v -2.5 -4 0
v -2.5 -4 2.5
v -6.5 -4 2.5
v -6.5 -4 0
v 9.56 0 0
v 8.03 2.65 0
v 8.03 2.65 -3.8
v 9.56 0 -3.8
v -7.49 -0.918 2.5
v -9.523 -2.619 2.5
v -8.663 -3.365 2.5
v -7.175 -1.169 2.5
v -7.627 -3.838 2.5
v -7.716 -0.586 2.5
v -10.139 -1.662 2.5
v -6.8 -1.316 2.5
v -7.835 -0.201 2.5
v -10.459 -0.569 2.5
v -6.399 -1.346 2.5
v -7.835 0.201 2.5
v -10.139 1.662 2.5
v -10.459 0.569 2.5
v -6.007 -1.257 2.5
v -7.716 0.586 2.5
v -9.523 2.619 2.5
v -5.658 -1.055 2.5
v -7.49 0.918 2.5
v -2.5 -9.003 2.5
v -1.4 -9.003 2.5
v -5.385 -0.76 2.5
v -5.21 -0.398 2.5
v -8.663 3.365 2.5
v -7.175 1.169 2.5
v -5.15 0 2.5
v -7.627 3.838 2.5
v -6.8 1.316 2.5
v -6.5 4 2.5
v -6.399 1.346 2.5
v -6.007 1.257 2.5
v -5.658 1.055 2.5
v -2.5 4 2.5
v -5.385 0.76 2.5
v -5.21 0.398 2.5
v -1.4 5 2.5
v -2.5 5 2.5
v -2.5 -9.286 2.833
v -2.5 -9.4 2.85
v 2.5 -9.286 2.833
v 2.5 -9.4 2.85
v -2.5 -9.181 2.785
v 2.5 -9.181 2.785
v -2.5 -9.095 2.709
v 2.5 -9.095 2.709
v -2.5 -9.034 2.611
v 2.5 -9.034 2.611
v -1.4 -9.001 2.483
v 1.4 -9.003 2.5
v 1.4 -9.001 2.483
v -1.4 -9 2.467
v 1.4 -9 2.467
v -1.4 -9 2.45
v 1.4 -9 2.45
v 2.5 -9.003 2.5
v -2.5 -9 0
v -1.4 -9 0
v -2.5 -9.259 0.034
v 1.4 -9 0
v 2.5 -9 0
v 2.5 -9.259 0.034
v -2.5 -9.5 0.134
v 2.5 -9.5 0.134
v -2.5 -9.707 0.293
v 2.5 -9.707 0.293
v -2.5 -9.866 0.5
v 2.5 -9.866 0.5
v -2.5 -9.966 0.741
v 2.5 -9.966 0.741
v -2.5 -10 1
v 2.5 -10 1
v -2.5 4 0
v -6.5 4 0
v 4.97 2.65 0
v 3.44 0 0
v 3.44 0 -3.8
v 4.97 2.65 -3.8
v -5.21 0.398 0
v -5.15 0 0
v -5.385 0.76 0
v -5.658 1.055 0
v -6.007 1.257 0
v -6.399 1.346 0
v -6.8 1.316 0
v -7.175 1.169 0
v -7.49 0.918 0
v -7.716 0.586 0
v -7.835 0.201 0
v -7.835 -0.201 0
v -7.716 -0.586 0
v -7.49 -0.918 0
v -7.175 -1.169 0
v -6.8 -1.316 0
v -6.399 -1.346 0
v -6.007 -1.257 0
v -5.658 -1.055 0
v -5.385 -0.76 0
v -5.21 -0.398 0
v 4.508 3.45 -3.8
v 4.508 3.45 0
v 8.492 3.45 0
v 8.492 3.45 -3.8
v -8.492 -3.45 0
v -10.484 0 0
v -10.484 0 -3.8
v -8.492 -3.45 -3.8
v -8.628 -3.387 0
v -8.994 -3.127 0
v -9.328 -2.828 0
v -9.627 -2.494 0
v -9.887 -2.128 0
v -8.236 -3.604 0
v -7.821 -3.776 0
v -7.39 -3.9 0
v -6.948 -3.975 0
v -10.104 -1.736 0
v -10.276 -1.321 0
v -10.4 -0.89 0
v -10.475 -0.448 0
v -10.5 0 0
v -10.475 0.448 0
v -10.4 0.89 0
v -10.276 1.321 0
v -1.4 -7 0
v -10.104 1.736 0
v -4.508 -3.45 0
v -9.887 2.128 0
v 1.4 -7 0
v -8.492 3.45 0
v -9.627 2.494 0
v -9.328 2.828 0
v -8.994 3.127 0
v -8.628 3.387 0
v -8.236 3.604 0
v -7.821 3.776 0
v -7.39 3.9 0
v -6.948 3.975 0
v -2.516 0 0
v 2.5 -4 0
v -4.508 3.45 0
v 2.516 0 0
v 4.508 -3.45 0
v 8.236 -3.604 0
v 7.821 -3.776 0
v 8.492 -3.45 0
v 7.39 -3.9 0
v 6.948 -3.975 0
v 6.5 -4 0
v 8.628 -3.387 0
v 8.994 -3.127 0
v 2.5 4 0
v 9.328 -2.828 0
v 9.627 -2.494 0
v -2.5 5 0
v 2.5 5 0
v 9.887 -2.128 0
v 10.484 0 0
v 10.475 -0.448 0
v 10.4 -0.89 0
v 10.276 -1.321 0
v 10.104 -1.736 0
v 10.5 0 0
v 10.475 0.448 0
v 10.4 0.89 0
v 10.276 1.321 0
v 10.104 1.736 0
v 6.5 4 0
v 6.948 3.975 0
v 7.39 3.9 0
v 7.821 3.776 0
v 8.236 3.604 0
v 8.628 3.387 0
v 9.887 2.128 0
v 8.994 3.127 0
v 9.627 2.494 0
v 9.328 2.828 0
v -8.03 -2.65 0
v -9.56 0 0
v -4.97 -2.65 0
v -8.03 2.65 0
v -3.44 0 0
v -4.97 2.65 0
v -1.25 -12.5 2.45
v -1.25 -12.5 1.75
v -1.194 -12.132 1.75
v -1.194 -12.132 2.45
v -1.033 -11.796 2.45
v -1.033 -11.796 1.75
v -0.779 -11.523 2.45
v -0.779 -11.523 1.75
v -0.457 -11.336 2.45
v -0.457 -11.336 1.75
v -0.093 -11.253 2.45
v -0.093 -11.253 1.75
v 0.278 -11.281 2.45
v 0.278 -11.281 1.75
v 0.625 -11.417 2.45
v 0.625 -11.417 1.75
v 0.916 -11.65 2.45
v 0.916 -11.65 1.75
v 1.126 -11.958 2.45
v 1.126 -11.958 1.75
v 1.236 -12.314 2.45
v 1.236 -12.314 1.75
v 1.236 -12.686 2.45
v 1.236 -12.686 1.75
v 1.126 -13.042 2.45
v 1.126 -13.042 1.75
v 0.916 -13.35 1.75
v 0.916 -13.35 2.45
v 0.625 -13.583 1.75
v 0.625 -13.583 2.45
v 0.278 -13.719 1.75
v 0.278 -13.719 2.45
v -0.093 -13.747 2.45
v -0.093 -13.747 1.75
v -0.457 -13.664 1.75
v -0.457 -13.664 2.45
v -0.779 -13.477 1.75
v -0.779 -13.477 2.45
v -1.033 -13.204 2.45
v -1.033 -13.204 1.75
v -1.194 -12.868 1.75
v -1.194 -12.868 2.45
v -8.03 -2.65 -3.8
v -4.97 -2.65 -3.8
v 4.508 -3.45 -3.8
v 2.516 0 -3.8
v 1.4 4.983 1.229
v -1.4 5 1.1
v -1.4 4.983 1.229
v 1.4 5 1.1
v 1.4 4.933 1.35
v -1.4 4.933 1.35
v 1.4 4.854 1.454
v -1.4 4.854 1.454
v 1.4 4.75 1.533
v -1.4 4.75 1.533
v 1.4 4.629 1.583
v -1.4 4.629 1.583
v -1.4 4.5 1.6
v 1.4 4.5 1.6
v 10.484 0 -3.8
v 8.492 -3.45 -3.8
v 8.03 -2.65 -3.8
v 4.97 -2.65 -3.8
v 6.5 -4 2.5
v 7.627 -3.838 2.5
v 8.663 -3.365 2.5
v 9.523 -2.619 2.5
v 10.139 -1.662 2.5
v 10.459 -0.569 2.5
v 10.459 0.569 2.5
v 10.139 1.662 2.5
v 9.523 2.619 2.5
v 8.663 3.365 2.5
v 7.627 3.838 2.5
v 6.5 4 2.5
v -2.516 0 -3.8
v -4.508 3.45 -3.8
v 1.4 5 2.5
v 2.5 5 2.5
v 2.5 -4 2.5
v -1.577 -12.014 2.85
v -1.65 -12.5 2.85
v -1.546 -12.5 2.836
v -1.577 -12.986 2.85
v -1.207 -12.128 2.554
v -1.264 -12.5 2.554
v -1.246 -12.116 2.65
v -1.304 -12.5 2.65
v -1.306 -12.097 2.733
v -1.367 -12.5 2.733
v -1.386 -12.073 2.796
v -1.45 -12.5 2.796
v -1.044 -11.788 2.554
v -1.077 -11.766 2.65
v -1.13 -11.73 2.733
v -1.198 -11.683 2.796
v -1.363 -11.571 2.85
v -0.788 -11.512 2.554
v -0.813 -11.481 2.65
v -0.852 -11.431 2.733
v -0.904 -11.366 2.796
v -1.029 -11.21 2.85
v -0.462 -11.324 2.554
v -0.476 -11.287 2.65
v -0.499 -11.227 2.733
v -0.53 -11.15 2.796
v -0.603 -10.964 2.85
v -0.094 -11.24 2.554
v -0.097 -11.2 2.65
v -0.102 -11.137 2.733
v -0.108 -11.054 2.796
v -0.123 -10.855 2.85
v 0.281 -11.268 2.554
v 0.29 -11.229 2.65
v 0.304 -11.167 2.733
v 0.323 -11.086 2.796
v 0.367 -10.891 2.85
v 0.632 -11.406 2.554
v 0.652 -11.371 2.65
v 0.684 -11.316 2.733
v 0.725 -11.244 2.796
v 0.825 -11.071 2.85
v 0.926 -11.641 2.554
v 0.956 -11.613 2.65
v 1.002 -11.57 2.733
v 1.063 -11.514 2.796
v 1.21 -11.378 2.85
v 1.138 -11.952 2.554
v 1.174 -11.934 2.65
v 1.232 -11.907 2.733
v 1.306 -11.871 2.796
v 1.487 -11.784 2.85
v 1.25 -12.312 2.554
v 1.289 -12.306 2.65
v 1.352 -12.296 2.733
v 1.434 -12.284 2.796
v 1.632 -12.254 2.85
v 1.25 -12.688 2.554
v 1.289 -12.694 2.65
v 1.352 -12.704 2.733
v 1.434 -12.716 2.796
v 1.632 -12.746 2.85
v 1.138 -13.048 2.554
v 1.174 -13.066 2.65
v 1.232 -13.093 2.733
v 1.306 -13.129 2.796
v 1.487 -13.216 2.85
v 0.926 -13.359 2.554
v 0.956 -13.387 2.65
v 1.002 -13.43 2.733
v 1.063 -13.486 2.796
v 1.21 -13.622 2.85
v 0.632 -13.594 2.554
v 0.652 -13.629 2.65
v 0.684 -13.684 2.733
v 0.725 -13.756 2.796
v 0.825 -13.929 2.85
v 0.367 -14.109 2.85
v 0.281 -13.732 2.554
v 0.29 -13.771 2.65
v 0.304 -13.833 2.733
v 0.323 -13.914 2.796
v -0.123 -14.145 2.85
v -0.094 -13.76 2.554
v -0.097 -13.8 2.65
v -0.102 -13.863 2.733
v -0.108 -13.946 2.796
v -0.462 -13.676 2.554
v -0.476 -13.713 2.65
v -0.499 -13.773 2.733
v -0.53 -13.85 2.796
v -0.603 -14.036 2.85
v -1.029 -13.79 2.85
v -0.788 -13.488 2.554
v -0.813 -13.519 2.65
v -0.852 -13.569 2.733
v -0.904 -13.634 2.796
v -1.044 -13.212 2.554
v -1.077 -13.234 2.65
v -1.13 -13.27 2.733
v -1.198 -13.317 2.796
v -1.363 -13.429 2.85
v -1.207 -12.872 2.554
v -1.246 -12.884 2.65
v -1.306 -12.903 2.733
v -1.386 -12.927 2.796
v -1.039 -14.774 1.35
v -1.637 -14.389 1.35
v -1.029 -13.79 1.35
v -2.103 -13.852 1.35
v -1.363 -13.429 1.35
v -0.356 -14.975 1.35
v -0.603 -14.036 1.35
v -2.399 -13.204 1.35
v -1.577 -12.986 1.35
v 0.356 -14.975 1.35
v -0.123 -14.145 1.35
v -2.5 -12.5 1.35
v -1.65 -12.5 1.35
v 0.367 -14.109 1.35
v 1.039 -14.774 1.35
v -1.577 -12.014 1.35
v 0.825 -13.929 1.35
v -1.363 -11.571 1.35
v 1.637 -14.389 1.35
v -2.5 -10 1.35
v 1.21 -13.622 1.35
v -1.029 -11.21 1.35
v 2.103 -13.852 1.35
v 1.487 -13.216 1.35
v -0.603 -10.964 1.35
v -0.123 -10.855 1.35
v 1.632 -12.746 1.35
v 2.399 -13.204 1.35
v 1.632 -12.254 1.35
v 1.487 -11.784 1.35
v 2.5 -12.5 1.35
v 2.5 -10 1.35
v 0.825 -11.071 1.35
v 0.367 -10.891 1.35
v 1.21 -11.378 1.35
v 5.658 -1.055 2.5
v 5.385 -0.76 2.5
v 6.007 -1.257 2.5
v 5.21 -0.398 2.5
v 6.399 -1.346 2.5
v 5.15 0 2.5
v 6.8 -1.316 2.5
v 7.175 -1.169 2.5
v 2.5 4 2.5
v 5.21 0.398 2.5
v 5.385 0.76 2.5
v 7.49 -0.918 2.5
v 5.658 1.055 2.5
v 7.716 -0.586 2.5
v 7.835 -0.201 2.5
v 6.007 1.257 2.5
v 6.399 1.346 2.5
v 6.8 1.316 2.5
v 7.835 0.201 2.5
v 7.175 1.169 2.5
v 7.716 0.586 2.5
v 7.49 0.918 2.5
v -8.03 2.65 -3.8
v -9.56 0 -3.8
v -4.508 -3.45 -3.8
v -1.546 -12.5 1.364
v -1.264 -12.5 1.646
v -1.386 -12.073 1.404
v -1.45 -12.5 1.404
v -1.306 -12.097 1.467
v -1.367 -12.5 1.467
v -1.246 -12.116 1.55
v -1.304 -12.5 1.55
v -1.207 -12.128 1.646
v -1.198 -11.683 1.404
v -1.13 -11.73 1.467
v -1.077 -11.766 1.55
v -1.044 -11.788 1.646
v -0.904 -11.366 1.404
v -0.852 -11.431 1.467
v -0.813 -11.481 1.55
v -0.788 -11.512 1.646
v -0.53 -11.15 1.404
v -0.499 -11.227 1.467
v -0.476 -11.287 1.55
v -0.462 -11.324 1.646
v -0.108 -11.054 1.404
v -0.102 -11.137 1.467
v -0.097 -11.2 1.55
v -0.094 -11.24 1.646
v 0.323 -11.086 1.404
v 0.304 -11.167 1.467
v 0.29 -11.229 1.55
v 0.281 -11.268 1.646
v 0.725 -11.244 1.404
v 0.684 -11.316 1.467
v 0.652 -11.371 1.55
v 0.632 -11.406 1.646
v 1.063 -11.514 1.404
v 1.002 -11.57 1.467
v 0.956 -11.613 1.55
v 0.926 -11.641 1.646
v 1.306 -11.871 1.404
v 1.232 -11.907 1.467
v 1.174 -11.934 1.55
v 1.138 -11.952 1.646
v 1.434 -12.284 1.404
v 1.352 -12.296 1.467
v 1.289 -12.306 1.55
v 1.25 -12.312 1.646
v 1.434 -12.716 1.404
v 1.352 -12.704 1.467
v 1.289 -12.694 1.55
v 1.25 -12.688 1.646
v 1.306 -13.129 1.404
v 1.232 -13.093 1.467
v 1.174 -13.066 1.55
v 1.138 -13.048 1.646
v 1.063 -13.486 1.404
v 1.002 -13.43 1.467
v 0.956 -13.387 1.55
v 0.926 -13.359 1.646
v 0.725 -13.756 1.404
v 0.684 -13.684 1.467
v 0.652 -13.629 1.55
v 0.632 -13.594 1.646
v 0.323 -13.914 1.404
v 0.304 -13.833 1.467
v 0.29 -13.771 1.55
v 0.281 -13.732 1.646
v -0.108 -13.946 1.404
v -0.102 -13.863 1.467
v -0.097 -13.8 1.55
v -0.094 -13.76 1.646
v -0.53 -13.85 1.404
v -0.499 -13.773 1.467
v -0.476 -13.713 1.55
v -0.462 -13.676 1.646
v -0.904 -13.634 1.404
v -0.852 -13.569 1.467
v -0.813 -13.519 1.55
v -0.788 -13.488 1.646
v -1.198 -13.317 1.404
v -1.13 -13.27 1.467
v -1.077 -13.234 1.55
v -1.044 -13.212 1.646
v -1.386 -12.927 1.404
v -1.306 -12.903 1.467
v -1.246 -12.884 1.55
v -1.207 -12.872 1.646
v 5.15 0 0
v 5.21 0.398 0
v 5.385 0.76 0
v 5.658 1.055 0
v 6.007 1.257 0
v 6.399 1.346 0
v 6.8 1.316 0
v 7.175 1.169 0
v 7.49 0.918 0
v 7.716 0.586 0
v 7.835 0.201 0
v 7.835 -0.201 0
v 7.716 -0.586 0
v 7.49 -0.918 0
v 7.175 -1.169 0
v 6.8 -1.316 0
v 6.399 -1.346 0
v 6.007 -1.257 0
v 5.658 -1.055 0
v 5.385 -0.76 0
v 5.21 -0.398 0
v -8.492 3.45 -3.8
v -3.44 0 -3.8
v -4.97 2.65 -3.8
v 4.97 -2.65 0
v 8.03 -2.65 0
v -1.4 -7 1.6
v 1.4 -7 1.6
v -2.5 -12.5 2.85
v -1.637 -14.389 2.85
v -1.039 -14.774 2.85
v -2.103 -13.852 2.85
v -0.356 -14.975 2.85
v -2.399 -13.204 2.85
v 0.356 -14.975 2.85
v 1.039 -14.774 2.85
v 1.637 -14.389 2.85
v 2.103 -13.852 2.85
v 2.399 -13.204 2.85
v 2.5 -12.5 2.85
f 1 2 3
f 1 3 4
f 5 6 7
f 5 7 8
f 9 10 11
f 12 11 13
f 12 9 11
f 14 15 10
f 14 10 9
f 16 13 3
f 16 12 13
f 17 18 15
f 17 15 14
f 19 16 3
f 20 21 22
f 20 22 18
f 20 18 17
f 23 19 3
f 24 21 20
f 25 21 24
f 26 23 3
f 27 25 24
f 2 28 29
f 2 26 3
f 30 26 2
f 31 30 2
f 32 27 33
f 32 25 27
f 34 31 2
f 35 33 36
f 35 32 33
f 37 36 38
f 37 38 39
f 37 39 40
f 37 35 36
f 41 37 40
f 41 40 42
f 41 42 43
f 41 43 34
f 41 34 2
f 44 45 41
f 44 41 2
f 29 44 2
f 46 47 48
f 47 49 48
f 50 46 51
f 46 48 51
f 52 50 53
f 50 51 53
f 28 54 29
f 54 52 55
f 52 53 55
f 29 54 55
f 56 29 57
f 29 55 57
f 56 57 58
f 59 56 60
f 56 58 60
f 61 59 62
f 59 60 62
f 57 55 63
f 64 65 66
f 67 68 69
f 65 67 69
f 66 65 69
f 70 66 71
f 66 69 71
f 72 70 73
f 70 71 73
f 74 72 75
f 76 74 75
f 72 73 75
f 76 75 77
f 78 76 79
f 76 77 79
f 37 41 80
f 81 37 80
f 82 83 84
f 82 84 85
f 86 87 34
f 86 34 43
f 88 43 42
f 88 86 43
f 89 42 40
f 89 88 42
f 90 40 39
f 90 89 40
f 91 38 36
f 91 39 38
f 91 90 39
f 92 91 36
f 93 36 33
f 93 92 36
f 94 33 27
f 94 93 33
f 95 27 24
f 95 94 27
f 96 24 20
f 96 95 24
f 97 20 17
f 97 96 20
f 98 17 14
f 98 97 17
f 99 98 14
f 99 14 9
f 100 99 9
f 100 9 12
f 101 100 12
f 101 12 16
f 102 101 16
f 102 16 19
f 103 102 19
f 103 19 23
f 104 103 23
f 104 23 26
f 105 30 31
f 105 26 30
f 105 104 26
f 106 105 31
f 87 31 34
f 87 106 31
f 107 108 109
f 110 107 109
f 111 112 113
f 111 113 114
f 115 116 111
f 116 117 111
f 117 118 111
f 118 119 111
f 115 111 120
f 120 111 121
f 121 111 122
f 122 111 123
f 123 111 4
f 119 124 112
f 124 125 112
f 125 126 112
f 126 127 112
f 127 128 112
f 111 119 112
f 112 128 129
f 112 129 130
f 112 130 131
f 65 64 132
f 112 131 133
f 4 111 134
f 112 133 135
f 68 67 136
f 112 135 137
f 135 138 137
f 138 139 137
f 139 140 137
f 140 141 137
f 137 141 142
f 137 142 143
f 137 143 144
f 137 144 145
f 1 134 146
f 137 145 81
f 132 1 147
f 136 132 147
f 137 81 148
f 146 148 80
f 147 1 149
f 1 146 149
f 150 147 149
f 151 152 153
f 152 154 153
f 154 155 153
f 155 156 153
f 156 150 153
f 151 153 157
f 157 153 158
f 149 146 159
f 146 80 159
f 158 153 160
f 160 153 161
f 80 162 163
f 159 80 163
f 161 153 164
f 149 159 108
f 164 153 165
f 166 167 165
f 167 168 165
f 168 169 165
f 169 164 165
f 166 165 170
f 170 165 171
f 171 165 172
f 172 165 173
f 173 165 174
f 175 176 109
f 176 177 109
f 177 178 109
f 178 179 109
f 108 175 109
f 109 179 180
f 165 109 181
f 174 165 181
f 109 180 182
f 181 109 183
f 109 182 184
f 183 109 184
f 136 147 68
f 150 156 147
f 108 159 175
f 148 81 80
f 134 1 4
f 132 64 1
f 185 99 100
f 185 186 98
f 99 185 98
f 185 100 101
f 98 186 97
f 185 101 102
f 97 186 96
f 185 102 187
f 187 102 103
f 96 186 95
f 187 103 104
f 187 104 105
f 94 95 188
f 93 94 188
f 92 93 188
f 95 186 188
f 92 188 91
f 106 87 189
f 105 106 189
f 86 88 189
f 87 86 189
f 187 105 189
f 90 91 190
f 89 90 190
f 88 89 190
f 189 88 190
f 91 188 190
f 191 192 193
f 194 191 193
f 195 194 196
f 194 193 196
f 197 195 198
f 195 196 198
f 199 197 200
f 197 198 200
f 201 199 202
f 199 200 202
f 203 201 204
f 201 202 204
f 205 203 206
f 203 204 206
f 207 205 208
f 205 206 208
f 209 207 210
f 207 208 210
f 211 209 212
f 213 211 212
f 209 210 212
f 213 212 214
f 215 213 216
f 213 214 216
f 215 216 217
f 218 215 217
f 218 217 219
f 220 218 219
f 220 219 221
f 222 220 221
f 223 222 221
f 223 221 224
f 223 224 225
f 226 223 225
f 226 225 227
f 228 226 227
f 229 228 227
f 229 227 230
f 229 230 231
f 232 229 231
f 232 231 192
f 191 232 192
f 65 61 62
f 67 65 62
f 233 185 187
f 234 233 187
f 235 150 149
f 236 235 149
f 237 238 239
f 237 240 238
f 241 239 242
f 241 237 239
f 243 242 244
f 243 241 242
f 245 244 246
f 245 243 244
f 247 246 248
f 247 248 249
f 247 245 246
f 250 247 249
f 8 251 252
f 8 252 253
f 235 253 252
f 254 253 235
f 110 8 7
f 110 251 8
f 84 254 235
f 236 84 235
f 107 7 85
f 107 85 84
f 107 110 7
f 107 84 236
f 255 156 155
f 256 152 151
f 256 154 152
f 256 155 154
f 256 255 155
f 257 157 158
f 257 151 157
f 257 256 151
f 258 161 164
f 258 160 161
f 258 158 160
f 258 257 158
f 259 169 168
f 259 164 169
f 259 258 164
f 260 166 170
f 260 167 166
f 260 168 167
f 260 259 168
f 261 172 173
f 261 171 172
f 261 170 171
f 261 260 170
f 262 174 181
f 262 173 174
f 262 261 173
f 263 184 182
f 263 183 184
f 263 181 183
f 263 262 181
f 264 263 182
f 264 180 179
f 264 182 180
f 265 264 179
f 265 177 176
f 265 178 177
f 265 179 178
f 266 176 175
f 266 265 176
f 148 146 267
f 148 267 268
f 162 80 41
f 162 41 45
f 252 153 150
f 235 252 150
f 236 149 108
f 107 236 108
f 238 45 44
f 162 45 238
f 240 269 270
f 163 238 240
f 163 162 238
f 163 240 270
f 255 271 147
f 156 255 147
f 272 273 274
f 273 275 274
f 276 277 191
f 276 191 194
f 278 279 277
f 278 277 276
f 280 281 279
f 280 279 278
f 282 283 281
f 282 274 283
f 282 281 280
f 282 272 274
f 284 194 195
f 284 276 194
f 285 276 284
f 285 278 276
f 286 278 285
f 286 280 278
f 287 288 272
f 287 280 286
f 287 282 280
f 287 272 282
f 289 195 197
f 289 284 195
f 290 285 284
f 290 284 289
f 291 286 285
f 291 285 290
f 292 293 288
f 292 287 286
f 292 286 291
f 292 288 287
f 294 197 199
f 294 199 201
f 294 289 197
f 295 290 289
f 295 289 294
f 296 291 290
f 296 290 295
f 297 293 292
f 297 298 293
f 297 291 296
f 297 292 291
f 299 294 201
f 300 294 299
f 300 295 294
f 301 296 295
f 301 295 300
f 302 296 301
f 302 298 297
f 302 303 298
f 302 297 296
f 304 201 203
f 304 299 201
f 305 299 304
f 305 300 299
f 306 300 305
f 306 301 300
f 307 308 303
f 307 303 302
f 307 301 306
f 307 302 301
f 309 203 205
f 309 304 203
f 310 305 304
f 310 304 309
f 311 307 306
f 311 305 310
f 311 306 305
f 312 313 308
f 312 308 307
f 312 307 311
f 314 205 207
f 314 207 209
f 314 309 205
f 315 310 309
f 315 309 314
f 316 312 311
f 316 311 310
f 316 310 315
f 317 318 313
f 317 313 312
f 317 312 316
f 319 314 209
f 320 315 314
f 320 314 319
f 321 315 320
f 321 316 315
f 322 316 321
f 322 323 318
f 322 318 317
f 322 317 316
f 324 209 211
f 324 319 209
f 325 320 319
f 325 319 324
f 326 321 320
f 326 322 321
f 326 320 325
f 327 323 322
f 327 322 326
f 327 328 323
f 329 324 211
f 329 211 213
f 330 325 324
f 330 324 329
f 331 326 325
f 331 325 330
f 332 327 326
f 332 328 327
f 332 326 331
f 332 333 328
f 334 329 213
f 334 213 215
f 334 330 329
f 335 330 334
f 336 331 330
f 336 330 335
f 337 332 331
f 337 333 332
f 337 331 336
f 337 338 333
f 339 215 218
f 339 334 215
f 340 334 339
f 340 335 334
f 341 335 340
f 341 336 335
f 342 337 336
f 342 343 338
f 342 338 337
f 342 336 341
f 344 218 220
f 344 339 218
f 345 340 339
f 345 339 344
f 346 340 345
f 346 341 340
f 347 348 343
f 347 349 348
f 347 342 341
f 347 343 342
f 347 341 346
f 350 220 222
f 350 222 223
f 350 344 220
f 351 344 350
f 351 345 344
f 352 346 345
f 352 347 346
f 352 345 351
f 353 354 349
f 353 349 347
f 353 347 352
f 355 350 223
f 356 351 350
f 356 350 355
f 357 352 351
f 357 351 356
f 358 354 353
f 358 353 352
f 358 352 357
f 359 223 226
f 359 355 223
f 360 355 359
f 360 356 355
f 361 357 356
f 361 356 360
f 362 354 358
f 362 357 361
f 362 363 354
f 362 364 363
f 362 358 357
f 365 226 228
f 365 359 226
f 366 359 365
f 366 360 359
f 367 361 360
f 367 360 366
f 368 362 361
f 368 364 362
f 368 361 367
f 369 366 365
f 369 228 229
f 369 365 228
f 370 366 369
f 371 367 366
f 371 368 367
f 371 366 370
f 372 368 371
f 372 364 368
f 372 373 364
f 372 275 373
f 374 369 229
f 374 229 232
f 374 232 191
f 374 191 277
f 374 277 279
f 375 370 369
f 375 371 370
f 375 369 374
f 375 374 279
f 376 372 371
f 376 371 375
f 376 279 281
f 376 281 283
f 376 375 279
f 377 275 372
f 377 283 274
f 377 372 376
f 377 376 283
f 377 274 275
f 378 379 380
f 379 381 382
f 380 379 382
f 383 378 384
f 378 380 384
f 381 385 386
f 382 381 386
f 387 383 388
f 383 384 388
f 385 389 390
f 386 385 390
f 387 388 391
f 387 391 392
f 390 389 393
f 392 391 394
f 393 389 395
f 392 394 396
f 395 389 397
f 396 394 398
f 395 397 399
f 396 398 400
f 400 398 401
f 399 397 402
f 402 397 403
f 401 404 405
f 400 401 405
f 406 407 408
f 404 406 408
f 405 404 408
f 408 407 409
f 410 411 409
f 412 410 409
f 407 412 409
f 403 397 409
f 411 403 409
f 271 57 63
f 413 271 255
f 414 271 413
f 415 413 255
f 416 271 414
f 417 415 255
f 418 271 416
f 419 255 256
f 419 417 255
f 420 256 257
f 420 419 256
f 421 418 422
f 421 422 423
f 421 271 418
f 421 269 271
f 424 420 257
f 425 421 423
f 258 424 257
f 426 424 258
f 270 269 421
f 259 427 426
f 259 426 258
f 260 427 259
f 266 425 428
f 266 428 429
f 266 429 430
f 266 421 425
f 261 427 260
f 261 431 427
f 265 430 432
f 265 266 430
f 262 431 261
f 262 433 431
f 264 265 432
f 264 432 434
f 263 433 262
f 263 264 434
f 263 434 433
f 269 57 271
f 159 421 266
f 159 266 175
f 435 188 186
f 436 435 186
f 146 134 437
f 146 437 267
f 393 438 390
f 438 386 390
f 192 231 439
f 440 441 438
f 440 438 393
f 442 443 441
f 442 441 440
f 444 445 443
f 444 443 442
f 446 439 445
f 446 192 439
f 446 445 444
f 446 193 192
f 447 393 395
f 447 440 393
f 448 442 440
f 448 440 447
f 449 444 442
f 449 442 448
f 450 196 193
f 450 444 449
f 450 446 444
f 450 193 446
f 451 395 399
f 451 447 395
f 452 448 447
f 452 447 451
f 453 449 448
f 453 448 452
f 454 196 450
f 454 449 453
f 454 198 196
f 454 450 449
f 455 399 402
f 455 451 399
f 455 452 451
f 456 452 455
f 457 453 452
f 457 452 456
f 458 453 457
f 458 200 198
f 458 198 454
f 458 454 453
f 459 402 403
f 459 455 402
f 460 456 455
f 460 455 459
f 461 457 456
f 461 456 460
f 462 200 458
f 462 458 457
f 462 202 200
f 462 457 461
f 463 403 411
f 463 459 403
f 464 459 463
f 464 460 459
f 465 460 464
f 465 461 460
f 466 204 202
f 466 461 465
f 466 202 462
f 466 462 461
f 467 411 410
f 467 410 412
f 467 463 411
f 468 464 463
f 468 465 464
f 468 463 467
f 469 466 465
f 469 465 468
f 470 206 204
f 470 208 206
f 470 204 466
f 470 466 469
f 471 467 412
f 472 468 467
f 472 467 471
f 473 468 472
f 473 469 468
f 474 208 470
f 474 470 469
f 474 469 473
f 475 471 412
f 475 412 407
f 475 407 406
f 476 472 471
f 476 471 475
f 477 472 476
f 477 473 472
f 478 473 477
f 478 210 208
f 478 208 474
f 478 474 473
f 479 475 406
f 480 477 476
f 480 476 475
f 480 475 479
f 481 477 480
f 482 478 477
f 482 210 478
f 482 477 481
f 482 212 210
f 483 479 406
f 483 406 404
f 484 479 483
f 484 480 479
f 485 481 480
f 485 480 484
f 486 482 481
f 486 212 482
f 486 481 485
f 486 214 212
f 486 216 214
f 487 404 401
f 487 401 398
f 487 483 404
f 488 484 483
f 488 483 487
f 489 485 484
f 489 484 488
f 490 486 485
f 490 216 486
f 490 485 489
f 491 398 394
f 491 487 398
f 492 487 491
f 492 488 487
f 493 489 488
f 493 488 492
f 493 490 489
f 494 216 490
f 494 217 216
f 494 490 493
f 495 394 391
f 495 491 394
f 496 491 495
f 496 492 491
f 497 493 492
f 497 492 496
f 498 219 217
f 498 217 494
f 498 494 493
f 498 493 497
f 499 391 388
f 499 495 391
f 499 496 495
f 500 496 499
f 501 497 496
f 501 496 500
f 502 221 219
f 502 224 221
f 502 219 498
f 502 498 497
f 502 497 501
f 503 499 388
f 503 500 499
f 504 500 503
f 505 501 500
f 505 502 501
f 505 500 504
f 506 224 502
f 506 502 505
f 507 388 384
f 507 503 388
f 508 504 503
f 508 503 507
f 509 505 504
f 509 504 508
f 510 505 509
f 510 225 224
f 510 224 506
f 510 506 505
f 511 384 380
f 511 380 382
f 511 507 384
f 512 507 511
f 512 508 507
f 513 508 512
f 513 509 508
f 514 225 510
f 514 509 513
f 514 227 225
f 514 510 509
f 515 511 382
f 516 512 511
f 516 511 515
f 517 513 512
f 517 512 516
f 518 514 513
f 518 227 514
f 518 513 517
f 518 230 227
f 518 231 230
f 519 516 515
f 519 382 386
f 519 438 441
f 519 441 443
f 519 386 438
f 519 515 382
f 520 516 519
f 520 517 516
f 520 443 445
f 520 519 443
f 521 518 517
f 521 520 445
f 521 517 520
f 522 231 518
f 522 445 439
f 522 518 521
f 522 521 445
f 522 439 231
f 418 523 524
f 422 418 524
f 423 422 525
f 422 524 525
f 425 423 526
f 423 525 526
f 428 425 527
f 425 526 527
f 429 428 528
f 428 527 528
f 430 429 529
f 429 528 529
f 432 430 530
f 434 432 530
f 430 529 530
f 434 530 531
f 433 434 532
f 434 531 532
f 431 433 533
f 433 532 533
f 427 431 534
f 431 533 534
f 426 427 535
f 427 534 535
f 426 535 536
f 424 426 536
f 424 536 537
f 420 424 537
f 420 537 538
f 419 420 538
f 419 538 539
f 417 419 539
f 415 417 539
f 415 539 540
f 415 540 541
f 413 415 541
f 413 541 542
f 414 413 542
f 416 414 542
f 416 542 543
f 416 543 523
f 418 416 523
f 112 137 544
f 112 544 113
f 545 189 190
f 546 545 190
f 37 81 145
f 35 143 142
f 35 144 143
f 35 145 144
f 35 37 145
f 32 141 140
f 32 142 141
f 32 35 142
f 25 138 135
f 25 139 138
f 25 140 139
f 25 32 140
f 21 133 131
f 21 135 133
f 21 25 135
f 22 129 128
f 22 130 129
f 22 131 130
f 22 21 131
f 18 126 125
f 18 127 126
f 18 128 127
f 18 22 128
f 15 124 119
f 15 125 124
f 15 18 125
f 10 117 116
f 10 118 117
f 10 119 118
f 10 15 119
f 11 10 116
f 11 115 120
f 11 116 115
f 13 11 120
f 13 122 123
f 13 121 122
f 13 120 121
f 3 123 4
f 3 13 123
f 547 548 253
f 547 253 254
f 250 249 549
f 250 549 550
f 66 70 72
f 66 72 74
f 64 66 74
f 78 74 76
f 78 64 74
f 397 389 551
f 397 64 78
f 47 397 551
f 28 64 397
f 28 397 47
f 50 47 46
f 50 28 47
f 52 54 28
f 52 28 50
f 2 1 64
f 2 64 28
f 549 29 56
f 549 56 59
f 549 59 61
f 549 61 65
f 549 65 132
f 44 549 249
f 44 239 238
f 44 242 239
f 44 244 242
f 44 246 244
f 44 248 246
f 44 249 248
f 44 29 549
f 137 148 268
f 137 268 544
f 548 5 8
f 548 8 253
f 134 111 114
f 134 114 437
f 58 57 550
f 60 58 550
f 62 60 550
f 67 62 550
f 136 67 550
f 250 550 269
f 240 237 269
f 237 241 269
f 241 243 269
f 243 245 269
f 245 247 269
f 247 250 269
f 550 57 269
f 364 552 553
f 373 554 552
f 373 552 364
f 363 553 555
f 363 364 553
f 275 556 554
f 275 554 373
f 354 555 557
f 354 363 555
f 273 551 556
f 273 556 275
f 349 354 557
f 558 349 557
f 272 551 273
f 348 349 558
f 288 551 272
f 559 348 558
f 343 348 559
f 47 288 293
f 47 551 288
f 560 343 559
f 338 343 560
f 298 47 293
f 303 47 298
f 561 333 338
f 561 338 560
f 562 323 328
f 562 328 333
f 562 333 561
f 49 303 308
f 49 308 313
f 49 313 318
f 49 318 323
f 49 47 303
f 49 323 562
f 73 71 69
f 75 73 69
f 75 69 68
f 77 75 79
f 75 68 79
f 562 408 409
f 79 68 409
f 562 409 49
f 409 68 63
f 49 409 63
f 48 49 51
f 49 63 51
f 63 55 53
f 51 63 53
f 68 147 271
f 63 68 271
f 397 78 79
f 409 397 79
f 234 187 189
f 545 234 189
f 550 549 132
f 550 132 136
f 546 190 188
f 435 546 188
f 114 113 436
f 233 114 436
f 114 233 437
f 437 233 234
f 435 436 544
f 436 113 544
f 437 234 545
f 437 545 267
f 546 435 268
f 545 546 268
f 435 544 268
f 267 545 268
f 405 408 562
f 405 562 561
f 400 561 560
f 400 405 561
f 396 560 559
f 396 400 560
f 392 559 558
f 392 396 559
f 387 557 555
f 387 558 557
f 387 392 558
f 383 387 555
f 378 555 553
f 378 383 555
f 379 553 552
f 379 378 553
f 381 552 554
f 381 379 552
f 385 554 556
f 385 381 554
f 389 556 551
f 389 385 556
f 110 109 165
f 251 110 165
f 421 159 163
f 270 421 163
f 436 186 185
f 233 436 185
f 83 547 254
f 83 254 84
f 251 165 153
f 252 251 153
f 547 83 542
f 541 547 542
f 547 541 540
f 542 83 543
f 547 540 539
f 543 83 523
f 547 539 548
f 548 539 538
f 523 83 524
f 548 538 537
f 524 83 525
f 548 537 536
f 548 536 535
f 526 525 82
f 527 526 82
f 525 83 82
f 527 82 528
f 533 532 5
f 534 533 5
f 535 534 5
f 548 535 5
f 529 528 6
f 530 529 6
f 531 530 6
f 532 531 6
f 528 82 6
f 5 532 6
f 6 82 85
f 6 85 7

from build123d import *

# Parameters (mm, degrees)
SKETCH_1_W                    = 5
SKETCH_1_H                    = 10
EXTRUDE_297_DEPTH             = 2.5
SKETCH_2_W                    = 2.5
SKETCH_2_H                    = 8
EXTRUDE_2_DEPTH               = 8
HOLE_WIZARD_M2_5_2_D          = 2.7
EXTRUDE_1_DEPTH               = 3.8
FILLET_1_RADIUS               = 4
FILLET_1_LENGTH               = 2.5
FILLET_1_OF_MIRROR_1_2_RADIUS = 4
FILLET_1_OF_MIRROR_1_2_LENGTH = 2.5
SKETCH_13_W                   = 5
SKETCH_13_H                   = 2.5
EXTRUDE_3_DEPTH               = 5
SKETCH_15_W                   = 2.8
SKETCH_15_H                   = 14
CUT_EXTRUDE_2383_DEPTH        = 0.9
FILLET_2_R                    = 0.5
SKETCH_16_W                   = 5
SKETCH_16_H                   = 1
EXTRUDE_4_DEPTH               = 0.35
SKETCH_17_W                   = 5
SKETCH_17_H                   = 1.5
EXTRUDE_5_DEPTH               = 5
CUT_EXTRUDE_1_REACH           = 21.02
SKETCH_18_R                   = 1.25
FILLET_3_RADIUS               = 2.5
FILLET_3_LENGTH               = 1.5
FILLET_4_R                    = 0.4
FILLET_5_R                    = 1
CUT_EXTRUDE_2_REACH           = 21.09
SKETCH_19_W                   = 2.8
SKETCH_19_H                   = 2


with BuildPart() as part:
    # 草图1 → Extrude 297 (new body)
    with BuildSketch(Plane.XY):
        Rectangle(SKETCH_1_W, SKETCH_1_H)
    extrude(amount=EXTRUDE_297_DEPTH)

    # 草图2 → 凸台-拉伸2 (add)
    with BuildSketch(Plane(origin=(2.5, 0, 0), x_dir=(0, 0, -1), z_dir=(1, 0, 0))):
        with Locations((-1.25, 0)):
            Rectangle(SKETCH_2_W, SKETCH_2_H)
    extrude_2 = extrude(amount=EXTRUDE_2_DEPTH)

    # M2.5 间隙孔2 (through all)
    with Locations(Plane.XY.offset(2.5)):
        with Locations((6.5, 0)):
            hole_wizard_m2_5_2 = Hole(HOLE_WIZARD_M2_5_2_D / 2)

    # 草图11 → 拉伸-薄壁1 (add)
    with BuildSketch(Plane(origin=(0, 0, 0), x_dir=(-1, 0, 0), z_dir=(0, 0, -1))):
        Polygon((-4.508141571, 3.45), (-8.491858429, 3.45), (-10.483716857, 0), (-8.491858429, -3.45), (-4.508141571, -3.45), (-2.516283143, 0), align=None)
        Polygon((-4.970021787, 2.65), (-8.029978213, 2.65), (-9.559956427, 0), (-8.029978213, -2.65), (-4.970021787, -2.65), (-3.440043573, 0), align=None, mode=Mode.SUBTRACT)
    extrude_1 = extrude(amount=EXTRUDE_1_DEPTH)

    # 圆角1: full round fillet: the end face becomes a half cylinder, R = half its width
    fillet_1_face = Plane((10.5, 0, 1.25), x_dir=(0, 0, 1), z_dir=(1, 0, 0))  # on the end face: x along it, z out of the body
    fillet_1_slab = fillet_1_face.offset(-FILLET_1_RADIUS / 2) * Box(FILLET_1_LENGTH, 2 * FILLET_1_RADIUS, FILLET_1_RADIUS, mode=Mode.PRIVATE)  # the body's end, R deep
    fillet_1_round = Plane((6.5, 0, 1.25), x_dir=(1, 0, 0), z_dir=(0, 0, 1)) * Cylinder(FILLET_1_RADIUS, FILLET_1_LENGTH, mode=Mode.PRIVATE)  # its axis R under the face
    add(fillet_1_slab - fillet_1_round, mode=Mode.SUBTRACT)

    # 镜向1: 凸台-拉伸2, M2.5 间隙孔2, 拉伸-薄壁1 across plane
    add(extrude_2.mirror(Plane(origin=(0, 0, 0), x_dir=(0, 0, 1), z_dir=(1, 0, 0))))
    add(hole_wizard_m2_5_2.mirror(Plane(origin=(0, 0, 0), x_dir=(0, 0, 1), z_dir=(1, 0, 0))), mode=Mode.SUBTRACT)
    add(extrude_1.mirror(Plane(origin=(0, 0, 0), x_dir=(0, 0, 1), z_dir=(1, 0, 0))))

    # 圆角1 of Mirror 1 2: full round fillet: the end face becomes a half cylinder, R = half its width
    fillet_1_of_mirror_1_2_face = Plane((-10.5, 0, 1.25), x_dir=(0, 0, 1), z_dir=(-1, 0, 0))  # on the end face: x along it, z out of the body
    fillet_1_of_mirror_1_2_slab = fillet_1_of_mirror_1_2_face.offset(-FILLET_1_OF_MIRROR_1_2_RADIUS / 2) * Box(FILLET_1_OF_MIRROR_1_2_LENGTH, 2 * FILLET_1_OF_MIRROR_1_2_RADIUS, FILLET_1_OF_MIRROR_1_2_RADIUS, mode=Mode.PRIVATE)  # the body's end, R deep
    fillet_1_of_mirror_1_2_round = Plane((-6.5, 0, 1.25), x_dir=(-1, 0, 0), z_dir=(0, 0, 1)) * Cylinder(FILLET_1_OF_MIRROR_1_2_RADIUS, FILLET_1_OF_MIRROR_1_2_LENGTH, mode=Mode.PRIVATE)  # its axis R under the face
    add(fillet_1_of_mirror_1_2_slab - fillet_1_of_mirror_1_2_round, mode=Mode.SUBTRACT)

    # 草图13 → 凸台-拉伸3 (add)
    with BuildSketch(Plane.XZ.offset(5)):
        with Locations((0, 1.25)):
            Rectangle(SKETCH_13_W, SKETCH_13_H)
    extrude(amount=EXTRUDE_3_DEPTH)

    # 草图15 → Cut-Extrude 2383 (cut)
    with BuildSketch(Plane.XY.offset(2.5)):
        with Locations((0, -2)):
            Rectangle(SKETCH_15_W, SKETCH_15_H)
    extrude(amount=-CUT_EXTRUDE_2383_DEPTH, mode=Mode.SUBTRACT)

    # 圆角2
    fillet_2_edges = [part.edges().sort_by_distance(p)[0] for p in [
        (0, 5, 1.6),
    ]]
    fillet(fillet_2_edges, radius=FILLET_2_R)

    # 草图16 → 凸台-拉伸4 (add)
    with BuildSketch(Plane.XY.offset(2.5)):
        with Locations((0, -9.5)):
            Rectangle(SKETCH_16_W, SKETCH_16_H)
    extrude(amount=EXTRUDE_4_DEPTH)

    # 草图17 → 凸台-拉伸5 (add)
    with BuildSketch(Plane.XZ.offset(10)):
        with Locations((0, 2.1)):
            Rectangle(SKETCH_17_W, SKETCH_17_H)
    extrude(amount=EXTRUDE_5_DEPTH)

    # 草图18 → 切除-拉伸1 (cut, up to next)
    with BuildSketch(Plane(origin=(0, 0, 1.35), x_dir=(-1, 0, 0), z_dir=(0, 0, -1)), mode=Mode.PRIVATE) as cut_extrude_1_sk1:
        with Locations((0, -12.5)):
            Circle(SKETCH_18_R)
    cut_extrude_1_tool1 = extrude(cut_extrude_1_sk1.sketch, amount=-CUT_EXTRUDE_1_REACH, mode=Mode.PRIVATE) & part.part
    add(cut_extrude_1_tool1.solids().sort_by_distance((0, -12.5, 1.35))[0], mode=Mode.SUBTRACT)

    # 圆角3: full round fillet: the end face becomes a half cylinder, R = half its width
    fillet_3_face = Plane((0, -15, 2.1), x_dir=(0, 0, -1), z_dir=(0, -1, 0))  # on the end face: x along it, z out of the body
    fillet_3_slab = fillet_3_face.offset(-FILLET_3_RADIUS / 2) * Box(FILLET_3_LENGTH, 2 * FILLET_3_RADIUS, FILLET_3_RADIUS, mode=Mode.PRIVATE)  # the body's end, R deep
    fillet_3_round = Plane((0, -12.5, 2.1), x_dir=(0, -1, 0), z_dir=(0, 0, -1)) * Cylinder(FILLET_3_RADIUS, FILLET_3_LENGTH, mode=Mode.PRIVATE)  # its axis R under the face
    add(fillet_3_slab - fillet_3_round, mode=Mode.SUBTRACT)

    # 圆角4
    fillet_4_edges = [part.edges().sort_by_distance(p)[0] for p in [
        (1.25, -12.5, 2.85),
        (1.25, -12.5, 1.35),
        (0, -9, 2.85),
    ]]
    fillet(fillet_4_edges, radius=FILLET_4_R)

    # 圆角5
    fillet_5_edges = [part.edges().sort_by_distance(p)[0] for p in [
        (0, -10, 0),
    ]]
    fillet(fillet_5_edges, radius=FILLET_5_R)

    # 草图19 → 切除-拉伸2 (cut, up to next)
    with BuildSketch(Plane.XY.offset(1.6), mode=Mode.PRIVATE) as cut_extrude_2_sk1:
        with Locations((0, -8)):
            Rectangle(SKETCH_19_W, SKETCH_19_H)
    cut_extrude_2_tool1 = extrude(cut_extrude_2_sk1.sketch, amount=-CUT_EXTRUDE_2_REACH, mode=Mode.PRIVATE) & part.part
    add(cut_extrude_2_tool1.solids().sort_by_distance((0, -8, 1.6))[0], mode=Mode.SUBTRACT)


solid = part.part
